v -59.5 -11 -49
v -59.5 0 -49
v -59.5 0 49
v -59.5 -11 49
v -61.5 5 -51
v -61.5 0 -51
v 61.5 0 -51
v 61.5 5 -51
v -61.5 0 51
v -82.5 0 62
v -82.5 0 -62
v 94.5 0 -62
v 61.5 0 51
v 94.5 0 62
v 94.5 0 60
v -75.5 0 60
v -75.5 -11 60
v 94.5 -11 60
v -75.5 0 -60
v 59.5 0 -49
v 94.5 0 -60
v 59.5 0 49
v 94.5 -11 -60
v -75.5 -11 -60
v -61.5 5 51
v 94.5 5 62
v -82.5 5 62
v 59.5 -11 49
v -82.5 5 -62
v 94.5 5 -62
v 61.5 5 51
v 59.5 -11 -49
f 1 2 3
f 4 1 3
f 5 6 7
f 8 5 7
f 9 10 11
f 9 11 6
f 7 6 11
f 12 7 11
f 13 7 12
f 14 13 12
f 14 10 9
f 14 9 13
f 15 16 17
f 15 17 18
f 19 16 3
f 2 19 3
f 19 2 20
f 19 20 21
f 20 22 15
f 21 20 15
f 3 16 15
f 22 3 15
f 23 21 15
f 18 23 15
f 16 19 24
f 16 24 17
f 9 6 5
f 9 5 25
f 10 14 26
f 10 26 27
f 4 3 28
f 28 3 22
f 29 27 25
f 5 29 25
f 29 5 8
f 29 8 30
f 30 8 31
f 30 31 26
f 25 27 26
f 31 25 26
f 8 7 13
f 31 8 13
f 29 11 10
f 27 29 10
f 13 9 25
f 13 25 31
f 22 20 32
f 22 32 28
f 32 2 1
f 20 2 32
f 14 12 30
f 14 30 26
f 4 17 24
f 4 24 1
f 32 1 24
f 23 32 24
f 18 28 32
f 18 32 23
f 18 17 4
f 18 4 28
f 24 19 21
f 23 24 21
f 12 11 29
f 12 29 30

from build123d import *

# Parameters (mm, degrees)
F0_W     = 170
F0_H     = 120
F0_W_2   = 119
F0_H_2   = 98
F1_DEPTH = 11
F2_W     = 170
F2_H     = 124
F2_W_2   = 123
F2_H_2   = 102
F2_W_3   = 7
F3_DEPTH = 5


with BuildPart() as f1:
    # F0 (on Front) → F1 (new body)
    with BuildSketch(Plane.XZ):
        with Locations((9.5, 0)):
            Rectangle(F0_W, F0_H)
        Rectangle(F0_W_2, F0_H_2, mode=Mode.SUBTRACT)
    extrude(amount=F1_DEPTH)


with BuildPart() as f3:
    # F2 (on Front) → F3 (new body)
    with BuildSketch(Plane.XZ):
        with Locations((9.5, 0)):
            Rectangle(F2_W, F2_H)
        Rectangle(F2_W_2, F2_H_2, mode=Mode.SUBTRACT)
        with Locations((-79, 0)):
            Rectangle(F2_W_3, F2_H)
    extrude(amount=-F3_DEPTH)


solid = Compound([f1.part, f3.part])
